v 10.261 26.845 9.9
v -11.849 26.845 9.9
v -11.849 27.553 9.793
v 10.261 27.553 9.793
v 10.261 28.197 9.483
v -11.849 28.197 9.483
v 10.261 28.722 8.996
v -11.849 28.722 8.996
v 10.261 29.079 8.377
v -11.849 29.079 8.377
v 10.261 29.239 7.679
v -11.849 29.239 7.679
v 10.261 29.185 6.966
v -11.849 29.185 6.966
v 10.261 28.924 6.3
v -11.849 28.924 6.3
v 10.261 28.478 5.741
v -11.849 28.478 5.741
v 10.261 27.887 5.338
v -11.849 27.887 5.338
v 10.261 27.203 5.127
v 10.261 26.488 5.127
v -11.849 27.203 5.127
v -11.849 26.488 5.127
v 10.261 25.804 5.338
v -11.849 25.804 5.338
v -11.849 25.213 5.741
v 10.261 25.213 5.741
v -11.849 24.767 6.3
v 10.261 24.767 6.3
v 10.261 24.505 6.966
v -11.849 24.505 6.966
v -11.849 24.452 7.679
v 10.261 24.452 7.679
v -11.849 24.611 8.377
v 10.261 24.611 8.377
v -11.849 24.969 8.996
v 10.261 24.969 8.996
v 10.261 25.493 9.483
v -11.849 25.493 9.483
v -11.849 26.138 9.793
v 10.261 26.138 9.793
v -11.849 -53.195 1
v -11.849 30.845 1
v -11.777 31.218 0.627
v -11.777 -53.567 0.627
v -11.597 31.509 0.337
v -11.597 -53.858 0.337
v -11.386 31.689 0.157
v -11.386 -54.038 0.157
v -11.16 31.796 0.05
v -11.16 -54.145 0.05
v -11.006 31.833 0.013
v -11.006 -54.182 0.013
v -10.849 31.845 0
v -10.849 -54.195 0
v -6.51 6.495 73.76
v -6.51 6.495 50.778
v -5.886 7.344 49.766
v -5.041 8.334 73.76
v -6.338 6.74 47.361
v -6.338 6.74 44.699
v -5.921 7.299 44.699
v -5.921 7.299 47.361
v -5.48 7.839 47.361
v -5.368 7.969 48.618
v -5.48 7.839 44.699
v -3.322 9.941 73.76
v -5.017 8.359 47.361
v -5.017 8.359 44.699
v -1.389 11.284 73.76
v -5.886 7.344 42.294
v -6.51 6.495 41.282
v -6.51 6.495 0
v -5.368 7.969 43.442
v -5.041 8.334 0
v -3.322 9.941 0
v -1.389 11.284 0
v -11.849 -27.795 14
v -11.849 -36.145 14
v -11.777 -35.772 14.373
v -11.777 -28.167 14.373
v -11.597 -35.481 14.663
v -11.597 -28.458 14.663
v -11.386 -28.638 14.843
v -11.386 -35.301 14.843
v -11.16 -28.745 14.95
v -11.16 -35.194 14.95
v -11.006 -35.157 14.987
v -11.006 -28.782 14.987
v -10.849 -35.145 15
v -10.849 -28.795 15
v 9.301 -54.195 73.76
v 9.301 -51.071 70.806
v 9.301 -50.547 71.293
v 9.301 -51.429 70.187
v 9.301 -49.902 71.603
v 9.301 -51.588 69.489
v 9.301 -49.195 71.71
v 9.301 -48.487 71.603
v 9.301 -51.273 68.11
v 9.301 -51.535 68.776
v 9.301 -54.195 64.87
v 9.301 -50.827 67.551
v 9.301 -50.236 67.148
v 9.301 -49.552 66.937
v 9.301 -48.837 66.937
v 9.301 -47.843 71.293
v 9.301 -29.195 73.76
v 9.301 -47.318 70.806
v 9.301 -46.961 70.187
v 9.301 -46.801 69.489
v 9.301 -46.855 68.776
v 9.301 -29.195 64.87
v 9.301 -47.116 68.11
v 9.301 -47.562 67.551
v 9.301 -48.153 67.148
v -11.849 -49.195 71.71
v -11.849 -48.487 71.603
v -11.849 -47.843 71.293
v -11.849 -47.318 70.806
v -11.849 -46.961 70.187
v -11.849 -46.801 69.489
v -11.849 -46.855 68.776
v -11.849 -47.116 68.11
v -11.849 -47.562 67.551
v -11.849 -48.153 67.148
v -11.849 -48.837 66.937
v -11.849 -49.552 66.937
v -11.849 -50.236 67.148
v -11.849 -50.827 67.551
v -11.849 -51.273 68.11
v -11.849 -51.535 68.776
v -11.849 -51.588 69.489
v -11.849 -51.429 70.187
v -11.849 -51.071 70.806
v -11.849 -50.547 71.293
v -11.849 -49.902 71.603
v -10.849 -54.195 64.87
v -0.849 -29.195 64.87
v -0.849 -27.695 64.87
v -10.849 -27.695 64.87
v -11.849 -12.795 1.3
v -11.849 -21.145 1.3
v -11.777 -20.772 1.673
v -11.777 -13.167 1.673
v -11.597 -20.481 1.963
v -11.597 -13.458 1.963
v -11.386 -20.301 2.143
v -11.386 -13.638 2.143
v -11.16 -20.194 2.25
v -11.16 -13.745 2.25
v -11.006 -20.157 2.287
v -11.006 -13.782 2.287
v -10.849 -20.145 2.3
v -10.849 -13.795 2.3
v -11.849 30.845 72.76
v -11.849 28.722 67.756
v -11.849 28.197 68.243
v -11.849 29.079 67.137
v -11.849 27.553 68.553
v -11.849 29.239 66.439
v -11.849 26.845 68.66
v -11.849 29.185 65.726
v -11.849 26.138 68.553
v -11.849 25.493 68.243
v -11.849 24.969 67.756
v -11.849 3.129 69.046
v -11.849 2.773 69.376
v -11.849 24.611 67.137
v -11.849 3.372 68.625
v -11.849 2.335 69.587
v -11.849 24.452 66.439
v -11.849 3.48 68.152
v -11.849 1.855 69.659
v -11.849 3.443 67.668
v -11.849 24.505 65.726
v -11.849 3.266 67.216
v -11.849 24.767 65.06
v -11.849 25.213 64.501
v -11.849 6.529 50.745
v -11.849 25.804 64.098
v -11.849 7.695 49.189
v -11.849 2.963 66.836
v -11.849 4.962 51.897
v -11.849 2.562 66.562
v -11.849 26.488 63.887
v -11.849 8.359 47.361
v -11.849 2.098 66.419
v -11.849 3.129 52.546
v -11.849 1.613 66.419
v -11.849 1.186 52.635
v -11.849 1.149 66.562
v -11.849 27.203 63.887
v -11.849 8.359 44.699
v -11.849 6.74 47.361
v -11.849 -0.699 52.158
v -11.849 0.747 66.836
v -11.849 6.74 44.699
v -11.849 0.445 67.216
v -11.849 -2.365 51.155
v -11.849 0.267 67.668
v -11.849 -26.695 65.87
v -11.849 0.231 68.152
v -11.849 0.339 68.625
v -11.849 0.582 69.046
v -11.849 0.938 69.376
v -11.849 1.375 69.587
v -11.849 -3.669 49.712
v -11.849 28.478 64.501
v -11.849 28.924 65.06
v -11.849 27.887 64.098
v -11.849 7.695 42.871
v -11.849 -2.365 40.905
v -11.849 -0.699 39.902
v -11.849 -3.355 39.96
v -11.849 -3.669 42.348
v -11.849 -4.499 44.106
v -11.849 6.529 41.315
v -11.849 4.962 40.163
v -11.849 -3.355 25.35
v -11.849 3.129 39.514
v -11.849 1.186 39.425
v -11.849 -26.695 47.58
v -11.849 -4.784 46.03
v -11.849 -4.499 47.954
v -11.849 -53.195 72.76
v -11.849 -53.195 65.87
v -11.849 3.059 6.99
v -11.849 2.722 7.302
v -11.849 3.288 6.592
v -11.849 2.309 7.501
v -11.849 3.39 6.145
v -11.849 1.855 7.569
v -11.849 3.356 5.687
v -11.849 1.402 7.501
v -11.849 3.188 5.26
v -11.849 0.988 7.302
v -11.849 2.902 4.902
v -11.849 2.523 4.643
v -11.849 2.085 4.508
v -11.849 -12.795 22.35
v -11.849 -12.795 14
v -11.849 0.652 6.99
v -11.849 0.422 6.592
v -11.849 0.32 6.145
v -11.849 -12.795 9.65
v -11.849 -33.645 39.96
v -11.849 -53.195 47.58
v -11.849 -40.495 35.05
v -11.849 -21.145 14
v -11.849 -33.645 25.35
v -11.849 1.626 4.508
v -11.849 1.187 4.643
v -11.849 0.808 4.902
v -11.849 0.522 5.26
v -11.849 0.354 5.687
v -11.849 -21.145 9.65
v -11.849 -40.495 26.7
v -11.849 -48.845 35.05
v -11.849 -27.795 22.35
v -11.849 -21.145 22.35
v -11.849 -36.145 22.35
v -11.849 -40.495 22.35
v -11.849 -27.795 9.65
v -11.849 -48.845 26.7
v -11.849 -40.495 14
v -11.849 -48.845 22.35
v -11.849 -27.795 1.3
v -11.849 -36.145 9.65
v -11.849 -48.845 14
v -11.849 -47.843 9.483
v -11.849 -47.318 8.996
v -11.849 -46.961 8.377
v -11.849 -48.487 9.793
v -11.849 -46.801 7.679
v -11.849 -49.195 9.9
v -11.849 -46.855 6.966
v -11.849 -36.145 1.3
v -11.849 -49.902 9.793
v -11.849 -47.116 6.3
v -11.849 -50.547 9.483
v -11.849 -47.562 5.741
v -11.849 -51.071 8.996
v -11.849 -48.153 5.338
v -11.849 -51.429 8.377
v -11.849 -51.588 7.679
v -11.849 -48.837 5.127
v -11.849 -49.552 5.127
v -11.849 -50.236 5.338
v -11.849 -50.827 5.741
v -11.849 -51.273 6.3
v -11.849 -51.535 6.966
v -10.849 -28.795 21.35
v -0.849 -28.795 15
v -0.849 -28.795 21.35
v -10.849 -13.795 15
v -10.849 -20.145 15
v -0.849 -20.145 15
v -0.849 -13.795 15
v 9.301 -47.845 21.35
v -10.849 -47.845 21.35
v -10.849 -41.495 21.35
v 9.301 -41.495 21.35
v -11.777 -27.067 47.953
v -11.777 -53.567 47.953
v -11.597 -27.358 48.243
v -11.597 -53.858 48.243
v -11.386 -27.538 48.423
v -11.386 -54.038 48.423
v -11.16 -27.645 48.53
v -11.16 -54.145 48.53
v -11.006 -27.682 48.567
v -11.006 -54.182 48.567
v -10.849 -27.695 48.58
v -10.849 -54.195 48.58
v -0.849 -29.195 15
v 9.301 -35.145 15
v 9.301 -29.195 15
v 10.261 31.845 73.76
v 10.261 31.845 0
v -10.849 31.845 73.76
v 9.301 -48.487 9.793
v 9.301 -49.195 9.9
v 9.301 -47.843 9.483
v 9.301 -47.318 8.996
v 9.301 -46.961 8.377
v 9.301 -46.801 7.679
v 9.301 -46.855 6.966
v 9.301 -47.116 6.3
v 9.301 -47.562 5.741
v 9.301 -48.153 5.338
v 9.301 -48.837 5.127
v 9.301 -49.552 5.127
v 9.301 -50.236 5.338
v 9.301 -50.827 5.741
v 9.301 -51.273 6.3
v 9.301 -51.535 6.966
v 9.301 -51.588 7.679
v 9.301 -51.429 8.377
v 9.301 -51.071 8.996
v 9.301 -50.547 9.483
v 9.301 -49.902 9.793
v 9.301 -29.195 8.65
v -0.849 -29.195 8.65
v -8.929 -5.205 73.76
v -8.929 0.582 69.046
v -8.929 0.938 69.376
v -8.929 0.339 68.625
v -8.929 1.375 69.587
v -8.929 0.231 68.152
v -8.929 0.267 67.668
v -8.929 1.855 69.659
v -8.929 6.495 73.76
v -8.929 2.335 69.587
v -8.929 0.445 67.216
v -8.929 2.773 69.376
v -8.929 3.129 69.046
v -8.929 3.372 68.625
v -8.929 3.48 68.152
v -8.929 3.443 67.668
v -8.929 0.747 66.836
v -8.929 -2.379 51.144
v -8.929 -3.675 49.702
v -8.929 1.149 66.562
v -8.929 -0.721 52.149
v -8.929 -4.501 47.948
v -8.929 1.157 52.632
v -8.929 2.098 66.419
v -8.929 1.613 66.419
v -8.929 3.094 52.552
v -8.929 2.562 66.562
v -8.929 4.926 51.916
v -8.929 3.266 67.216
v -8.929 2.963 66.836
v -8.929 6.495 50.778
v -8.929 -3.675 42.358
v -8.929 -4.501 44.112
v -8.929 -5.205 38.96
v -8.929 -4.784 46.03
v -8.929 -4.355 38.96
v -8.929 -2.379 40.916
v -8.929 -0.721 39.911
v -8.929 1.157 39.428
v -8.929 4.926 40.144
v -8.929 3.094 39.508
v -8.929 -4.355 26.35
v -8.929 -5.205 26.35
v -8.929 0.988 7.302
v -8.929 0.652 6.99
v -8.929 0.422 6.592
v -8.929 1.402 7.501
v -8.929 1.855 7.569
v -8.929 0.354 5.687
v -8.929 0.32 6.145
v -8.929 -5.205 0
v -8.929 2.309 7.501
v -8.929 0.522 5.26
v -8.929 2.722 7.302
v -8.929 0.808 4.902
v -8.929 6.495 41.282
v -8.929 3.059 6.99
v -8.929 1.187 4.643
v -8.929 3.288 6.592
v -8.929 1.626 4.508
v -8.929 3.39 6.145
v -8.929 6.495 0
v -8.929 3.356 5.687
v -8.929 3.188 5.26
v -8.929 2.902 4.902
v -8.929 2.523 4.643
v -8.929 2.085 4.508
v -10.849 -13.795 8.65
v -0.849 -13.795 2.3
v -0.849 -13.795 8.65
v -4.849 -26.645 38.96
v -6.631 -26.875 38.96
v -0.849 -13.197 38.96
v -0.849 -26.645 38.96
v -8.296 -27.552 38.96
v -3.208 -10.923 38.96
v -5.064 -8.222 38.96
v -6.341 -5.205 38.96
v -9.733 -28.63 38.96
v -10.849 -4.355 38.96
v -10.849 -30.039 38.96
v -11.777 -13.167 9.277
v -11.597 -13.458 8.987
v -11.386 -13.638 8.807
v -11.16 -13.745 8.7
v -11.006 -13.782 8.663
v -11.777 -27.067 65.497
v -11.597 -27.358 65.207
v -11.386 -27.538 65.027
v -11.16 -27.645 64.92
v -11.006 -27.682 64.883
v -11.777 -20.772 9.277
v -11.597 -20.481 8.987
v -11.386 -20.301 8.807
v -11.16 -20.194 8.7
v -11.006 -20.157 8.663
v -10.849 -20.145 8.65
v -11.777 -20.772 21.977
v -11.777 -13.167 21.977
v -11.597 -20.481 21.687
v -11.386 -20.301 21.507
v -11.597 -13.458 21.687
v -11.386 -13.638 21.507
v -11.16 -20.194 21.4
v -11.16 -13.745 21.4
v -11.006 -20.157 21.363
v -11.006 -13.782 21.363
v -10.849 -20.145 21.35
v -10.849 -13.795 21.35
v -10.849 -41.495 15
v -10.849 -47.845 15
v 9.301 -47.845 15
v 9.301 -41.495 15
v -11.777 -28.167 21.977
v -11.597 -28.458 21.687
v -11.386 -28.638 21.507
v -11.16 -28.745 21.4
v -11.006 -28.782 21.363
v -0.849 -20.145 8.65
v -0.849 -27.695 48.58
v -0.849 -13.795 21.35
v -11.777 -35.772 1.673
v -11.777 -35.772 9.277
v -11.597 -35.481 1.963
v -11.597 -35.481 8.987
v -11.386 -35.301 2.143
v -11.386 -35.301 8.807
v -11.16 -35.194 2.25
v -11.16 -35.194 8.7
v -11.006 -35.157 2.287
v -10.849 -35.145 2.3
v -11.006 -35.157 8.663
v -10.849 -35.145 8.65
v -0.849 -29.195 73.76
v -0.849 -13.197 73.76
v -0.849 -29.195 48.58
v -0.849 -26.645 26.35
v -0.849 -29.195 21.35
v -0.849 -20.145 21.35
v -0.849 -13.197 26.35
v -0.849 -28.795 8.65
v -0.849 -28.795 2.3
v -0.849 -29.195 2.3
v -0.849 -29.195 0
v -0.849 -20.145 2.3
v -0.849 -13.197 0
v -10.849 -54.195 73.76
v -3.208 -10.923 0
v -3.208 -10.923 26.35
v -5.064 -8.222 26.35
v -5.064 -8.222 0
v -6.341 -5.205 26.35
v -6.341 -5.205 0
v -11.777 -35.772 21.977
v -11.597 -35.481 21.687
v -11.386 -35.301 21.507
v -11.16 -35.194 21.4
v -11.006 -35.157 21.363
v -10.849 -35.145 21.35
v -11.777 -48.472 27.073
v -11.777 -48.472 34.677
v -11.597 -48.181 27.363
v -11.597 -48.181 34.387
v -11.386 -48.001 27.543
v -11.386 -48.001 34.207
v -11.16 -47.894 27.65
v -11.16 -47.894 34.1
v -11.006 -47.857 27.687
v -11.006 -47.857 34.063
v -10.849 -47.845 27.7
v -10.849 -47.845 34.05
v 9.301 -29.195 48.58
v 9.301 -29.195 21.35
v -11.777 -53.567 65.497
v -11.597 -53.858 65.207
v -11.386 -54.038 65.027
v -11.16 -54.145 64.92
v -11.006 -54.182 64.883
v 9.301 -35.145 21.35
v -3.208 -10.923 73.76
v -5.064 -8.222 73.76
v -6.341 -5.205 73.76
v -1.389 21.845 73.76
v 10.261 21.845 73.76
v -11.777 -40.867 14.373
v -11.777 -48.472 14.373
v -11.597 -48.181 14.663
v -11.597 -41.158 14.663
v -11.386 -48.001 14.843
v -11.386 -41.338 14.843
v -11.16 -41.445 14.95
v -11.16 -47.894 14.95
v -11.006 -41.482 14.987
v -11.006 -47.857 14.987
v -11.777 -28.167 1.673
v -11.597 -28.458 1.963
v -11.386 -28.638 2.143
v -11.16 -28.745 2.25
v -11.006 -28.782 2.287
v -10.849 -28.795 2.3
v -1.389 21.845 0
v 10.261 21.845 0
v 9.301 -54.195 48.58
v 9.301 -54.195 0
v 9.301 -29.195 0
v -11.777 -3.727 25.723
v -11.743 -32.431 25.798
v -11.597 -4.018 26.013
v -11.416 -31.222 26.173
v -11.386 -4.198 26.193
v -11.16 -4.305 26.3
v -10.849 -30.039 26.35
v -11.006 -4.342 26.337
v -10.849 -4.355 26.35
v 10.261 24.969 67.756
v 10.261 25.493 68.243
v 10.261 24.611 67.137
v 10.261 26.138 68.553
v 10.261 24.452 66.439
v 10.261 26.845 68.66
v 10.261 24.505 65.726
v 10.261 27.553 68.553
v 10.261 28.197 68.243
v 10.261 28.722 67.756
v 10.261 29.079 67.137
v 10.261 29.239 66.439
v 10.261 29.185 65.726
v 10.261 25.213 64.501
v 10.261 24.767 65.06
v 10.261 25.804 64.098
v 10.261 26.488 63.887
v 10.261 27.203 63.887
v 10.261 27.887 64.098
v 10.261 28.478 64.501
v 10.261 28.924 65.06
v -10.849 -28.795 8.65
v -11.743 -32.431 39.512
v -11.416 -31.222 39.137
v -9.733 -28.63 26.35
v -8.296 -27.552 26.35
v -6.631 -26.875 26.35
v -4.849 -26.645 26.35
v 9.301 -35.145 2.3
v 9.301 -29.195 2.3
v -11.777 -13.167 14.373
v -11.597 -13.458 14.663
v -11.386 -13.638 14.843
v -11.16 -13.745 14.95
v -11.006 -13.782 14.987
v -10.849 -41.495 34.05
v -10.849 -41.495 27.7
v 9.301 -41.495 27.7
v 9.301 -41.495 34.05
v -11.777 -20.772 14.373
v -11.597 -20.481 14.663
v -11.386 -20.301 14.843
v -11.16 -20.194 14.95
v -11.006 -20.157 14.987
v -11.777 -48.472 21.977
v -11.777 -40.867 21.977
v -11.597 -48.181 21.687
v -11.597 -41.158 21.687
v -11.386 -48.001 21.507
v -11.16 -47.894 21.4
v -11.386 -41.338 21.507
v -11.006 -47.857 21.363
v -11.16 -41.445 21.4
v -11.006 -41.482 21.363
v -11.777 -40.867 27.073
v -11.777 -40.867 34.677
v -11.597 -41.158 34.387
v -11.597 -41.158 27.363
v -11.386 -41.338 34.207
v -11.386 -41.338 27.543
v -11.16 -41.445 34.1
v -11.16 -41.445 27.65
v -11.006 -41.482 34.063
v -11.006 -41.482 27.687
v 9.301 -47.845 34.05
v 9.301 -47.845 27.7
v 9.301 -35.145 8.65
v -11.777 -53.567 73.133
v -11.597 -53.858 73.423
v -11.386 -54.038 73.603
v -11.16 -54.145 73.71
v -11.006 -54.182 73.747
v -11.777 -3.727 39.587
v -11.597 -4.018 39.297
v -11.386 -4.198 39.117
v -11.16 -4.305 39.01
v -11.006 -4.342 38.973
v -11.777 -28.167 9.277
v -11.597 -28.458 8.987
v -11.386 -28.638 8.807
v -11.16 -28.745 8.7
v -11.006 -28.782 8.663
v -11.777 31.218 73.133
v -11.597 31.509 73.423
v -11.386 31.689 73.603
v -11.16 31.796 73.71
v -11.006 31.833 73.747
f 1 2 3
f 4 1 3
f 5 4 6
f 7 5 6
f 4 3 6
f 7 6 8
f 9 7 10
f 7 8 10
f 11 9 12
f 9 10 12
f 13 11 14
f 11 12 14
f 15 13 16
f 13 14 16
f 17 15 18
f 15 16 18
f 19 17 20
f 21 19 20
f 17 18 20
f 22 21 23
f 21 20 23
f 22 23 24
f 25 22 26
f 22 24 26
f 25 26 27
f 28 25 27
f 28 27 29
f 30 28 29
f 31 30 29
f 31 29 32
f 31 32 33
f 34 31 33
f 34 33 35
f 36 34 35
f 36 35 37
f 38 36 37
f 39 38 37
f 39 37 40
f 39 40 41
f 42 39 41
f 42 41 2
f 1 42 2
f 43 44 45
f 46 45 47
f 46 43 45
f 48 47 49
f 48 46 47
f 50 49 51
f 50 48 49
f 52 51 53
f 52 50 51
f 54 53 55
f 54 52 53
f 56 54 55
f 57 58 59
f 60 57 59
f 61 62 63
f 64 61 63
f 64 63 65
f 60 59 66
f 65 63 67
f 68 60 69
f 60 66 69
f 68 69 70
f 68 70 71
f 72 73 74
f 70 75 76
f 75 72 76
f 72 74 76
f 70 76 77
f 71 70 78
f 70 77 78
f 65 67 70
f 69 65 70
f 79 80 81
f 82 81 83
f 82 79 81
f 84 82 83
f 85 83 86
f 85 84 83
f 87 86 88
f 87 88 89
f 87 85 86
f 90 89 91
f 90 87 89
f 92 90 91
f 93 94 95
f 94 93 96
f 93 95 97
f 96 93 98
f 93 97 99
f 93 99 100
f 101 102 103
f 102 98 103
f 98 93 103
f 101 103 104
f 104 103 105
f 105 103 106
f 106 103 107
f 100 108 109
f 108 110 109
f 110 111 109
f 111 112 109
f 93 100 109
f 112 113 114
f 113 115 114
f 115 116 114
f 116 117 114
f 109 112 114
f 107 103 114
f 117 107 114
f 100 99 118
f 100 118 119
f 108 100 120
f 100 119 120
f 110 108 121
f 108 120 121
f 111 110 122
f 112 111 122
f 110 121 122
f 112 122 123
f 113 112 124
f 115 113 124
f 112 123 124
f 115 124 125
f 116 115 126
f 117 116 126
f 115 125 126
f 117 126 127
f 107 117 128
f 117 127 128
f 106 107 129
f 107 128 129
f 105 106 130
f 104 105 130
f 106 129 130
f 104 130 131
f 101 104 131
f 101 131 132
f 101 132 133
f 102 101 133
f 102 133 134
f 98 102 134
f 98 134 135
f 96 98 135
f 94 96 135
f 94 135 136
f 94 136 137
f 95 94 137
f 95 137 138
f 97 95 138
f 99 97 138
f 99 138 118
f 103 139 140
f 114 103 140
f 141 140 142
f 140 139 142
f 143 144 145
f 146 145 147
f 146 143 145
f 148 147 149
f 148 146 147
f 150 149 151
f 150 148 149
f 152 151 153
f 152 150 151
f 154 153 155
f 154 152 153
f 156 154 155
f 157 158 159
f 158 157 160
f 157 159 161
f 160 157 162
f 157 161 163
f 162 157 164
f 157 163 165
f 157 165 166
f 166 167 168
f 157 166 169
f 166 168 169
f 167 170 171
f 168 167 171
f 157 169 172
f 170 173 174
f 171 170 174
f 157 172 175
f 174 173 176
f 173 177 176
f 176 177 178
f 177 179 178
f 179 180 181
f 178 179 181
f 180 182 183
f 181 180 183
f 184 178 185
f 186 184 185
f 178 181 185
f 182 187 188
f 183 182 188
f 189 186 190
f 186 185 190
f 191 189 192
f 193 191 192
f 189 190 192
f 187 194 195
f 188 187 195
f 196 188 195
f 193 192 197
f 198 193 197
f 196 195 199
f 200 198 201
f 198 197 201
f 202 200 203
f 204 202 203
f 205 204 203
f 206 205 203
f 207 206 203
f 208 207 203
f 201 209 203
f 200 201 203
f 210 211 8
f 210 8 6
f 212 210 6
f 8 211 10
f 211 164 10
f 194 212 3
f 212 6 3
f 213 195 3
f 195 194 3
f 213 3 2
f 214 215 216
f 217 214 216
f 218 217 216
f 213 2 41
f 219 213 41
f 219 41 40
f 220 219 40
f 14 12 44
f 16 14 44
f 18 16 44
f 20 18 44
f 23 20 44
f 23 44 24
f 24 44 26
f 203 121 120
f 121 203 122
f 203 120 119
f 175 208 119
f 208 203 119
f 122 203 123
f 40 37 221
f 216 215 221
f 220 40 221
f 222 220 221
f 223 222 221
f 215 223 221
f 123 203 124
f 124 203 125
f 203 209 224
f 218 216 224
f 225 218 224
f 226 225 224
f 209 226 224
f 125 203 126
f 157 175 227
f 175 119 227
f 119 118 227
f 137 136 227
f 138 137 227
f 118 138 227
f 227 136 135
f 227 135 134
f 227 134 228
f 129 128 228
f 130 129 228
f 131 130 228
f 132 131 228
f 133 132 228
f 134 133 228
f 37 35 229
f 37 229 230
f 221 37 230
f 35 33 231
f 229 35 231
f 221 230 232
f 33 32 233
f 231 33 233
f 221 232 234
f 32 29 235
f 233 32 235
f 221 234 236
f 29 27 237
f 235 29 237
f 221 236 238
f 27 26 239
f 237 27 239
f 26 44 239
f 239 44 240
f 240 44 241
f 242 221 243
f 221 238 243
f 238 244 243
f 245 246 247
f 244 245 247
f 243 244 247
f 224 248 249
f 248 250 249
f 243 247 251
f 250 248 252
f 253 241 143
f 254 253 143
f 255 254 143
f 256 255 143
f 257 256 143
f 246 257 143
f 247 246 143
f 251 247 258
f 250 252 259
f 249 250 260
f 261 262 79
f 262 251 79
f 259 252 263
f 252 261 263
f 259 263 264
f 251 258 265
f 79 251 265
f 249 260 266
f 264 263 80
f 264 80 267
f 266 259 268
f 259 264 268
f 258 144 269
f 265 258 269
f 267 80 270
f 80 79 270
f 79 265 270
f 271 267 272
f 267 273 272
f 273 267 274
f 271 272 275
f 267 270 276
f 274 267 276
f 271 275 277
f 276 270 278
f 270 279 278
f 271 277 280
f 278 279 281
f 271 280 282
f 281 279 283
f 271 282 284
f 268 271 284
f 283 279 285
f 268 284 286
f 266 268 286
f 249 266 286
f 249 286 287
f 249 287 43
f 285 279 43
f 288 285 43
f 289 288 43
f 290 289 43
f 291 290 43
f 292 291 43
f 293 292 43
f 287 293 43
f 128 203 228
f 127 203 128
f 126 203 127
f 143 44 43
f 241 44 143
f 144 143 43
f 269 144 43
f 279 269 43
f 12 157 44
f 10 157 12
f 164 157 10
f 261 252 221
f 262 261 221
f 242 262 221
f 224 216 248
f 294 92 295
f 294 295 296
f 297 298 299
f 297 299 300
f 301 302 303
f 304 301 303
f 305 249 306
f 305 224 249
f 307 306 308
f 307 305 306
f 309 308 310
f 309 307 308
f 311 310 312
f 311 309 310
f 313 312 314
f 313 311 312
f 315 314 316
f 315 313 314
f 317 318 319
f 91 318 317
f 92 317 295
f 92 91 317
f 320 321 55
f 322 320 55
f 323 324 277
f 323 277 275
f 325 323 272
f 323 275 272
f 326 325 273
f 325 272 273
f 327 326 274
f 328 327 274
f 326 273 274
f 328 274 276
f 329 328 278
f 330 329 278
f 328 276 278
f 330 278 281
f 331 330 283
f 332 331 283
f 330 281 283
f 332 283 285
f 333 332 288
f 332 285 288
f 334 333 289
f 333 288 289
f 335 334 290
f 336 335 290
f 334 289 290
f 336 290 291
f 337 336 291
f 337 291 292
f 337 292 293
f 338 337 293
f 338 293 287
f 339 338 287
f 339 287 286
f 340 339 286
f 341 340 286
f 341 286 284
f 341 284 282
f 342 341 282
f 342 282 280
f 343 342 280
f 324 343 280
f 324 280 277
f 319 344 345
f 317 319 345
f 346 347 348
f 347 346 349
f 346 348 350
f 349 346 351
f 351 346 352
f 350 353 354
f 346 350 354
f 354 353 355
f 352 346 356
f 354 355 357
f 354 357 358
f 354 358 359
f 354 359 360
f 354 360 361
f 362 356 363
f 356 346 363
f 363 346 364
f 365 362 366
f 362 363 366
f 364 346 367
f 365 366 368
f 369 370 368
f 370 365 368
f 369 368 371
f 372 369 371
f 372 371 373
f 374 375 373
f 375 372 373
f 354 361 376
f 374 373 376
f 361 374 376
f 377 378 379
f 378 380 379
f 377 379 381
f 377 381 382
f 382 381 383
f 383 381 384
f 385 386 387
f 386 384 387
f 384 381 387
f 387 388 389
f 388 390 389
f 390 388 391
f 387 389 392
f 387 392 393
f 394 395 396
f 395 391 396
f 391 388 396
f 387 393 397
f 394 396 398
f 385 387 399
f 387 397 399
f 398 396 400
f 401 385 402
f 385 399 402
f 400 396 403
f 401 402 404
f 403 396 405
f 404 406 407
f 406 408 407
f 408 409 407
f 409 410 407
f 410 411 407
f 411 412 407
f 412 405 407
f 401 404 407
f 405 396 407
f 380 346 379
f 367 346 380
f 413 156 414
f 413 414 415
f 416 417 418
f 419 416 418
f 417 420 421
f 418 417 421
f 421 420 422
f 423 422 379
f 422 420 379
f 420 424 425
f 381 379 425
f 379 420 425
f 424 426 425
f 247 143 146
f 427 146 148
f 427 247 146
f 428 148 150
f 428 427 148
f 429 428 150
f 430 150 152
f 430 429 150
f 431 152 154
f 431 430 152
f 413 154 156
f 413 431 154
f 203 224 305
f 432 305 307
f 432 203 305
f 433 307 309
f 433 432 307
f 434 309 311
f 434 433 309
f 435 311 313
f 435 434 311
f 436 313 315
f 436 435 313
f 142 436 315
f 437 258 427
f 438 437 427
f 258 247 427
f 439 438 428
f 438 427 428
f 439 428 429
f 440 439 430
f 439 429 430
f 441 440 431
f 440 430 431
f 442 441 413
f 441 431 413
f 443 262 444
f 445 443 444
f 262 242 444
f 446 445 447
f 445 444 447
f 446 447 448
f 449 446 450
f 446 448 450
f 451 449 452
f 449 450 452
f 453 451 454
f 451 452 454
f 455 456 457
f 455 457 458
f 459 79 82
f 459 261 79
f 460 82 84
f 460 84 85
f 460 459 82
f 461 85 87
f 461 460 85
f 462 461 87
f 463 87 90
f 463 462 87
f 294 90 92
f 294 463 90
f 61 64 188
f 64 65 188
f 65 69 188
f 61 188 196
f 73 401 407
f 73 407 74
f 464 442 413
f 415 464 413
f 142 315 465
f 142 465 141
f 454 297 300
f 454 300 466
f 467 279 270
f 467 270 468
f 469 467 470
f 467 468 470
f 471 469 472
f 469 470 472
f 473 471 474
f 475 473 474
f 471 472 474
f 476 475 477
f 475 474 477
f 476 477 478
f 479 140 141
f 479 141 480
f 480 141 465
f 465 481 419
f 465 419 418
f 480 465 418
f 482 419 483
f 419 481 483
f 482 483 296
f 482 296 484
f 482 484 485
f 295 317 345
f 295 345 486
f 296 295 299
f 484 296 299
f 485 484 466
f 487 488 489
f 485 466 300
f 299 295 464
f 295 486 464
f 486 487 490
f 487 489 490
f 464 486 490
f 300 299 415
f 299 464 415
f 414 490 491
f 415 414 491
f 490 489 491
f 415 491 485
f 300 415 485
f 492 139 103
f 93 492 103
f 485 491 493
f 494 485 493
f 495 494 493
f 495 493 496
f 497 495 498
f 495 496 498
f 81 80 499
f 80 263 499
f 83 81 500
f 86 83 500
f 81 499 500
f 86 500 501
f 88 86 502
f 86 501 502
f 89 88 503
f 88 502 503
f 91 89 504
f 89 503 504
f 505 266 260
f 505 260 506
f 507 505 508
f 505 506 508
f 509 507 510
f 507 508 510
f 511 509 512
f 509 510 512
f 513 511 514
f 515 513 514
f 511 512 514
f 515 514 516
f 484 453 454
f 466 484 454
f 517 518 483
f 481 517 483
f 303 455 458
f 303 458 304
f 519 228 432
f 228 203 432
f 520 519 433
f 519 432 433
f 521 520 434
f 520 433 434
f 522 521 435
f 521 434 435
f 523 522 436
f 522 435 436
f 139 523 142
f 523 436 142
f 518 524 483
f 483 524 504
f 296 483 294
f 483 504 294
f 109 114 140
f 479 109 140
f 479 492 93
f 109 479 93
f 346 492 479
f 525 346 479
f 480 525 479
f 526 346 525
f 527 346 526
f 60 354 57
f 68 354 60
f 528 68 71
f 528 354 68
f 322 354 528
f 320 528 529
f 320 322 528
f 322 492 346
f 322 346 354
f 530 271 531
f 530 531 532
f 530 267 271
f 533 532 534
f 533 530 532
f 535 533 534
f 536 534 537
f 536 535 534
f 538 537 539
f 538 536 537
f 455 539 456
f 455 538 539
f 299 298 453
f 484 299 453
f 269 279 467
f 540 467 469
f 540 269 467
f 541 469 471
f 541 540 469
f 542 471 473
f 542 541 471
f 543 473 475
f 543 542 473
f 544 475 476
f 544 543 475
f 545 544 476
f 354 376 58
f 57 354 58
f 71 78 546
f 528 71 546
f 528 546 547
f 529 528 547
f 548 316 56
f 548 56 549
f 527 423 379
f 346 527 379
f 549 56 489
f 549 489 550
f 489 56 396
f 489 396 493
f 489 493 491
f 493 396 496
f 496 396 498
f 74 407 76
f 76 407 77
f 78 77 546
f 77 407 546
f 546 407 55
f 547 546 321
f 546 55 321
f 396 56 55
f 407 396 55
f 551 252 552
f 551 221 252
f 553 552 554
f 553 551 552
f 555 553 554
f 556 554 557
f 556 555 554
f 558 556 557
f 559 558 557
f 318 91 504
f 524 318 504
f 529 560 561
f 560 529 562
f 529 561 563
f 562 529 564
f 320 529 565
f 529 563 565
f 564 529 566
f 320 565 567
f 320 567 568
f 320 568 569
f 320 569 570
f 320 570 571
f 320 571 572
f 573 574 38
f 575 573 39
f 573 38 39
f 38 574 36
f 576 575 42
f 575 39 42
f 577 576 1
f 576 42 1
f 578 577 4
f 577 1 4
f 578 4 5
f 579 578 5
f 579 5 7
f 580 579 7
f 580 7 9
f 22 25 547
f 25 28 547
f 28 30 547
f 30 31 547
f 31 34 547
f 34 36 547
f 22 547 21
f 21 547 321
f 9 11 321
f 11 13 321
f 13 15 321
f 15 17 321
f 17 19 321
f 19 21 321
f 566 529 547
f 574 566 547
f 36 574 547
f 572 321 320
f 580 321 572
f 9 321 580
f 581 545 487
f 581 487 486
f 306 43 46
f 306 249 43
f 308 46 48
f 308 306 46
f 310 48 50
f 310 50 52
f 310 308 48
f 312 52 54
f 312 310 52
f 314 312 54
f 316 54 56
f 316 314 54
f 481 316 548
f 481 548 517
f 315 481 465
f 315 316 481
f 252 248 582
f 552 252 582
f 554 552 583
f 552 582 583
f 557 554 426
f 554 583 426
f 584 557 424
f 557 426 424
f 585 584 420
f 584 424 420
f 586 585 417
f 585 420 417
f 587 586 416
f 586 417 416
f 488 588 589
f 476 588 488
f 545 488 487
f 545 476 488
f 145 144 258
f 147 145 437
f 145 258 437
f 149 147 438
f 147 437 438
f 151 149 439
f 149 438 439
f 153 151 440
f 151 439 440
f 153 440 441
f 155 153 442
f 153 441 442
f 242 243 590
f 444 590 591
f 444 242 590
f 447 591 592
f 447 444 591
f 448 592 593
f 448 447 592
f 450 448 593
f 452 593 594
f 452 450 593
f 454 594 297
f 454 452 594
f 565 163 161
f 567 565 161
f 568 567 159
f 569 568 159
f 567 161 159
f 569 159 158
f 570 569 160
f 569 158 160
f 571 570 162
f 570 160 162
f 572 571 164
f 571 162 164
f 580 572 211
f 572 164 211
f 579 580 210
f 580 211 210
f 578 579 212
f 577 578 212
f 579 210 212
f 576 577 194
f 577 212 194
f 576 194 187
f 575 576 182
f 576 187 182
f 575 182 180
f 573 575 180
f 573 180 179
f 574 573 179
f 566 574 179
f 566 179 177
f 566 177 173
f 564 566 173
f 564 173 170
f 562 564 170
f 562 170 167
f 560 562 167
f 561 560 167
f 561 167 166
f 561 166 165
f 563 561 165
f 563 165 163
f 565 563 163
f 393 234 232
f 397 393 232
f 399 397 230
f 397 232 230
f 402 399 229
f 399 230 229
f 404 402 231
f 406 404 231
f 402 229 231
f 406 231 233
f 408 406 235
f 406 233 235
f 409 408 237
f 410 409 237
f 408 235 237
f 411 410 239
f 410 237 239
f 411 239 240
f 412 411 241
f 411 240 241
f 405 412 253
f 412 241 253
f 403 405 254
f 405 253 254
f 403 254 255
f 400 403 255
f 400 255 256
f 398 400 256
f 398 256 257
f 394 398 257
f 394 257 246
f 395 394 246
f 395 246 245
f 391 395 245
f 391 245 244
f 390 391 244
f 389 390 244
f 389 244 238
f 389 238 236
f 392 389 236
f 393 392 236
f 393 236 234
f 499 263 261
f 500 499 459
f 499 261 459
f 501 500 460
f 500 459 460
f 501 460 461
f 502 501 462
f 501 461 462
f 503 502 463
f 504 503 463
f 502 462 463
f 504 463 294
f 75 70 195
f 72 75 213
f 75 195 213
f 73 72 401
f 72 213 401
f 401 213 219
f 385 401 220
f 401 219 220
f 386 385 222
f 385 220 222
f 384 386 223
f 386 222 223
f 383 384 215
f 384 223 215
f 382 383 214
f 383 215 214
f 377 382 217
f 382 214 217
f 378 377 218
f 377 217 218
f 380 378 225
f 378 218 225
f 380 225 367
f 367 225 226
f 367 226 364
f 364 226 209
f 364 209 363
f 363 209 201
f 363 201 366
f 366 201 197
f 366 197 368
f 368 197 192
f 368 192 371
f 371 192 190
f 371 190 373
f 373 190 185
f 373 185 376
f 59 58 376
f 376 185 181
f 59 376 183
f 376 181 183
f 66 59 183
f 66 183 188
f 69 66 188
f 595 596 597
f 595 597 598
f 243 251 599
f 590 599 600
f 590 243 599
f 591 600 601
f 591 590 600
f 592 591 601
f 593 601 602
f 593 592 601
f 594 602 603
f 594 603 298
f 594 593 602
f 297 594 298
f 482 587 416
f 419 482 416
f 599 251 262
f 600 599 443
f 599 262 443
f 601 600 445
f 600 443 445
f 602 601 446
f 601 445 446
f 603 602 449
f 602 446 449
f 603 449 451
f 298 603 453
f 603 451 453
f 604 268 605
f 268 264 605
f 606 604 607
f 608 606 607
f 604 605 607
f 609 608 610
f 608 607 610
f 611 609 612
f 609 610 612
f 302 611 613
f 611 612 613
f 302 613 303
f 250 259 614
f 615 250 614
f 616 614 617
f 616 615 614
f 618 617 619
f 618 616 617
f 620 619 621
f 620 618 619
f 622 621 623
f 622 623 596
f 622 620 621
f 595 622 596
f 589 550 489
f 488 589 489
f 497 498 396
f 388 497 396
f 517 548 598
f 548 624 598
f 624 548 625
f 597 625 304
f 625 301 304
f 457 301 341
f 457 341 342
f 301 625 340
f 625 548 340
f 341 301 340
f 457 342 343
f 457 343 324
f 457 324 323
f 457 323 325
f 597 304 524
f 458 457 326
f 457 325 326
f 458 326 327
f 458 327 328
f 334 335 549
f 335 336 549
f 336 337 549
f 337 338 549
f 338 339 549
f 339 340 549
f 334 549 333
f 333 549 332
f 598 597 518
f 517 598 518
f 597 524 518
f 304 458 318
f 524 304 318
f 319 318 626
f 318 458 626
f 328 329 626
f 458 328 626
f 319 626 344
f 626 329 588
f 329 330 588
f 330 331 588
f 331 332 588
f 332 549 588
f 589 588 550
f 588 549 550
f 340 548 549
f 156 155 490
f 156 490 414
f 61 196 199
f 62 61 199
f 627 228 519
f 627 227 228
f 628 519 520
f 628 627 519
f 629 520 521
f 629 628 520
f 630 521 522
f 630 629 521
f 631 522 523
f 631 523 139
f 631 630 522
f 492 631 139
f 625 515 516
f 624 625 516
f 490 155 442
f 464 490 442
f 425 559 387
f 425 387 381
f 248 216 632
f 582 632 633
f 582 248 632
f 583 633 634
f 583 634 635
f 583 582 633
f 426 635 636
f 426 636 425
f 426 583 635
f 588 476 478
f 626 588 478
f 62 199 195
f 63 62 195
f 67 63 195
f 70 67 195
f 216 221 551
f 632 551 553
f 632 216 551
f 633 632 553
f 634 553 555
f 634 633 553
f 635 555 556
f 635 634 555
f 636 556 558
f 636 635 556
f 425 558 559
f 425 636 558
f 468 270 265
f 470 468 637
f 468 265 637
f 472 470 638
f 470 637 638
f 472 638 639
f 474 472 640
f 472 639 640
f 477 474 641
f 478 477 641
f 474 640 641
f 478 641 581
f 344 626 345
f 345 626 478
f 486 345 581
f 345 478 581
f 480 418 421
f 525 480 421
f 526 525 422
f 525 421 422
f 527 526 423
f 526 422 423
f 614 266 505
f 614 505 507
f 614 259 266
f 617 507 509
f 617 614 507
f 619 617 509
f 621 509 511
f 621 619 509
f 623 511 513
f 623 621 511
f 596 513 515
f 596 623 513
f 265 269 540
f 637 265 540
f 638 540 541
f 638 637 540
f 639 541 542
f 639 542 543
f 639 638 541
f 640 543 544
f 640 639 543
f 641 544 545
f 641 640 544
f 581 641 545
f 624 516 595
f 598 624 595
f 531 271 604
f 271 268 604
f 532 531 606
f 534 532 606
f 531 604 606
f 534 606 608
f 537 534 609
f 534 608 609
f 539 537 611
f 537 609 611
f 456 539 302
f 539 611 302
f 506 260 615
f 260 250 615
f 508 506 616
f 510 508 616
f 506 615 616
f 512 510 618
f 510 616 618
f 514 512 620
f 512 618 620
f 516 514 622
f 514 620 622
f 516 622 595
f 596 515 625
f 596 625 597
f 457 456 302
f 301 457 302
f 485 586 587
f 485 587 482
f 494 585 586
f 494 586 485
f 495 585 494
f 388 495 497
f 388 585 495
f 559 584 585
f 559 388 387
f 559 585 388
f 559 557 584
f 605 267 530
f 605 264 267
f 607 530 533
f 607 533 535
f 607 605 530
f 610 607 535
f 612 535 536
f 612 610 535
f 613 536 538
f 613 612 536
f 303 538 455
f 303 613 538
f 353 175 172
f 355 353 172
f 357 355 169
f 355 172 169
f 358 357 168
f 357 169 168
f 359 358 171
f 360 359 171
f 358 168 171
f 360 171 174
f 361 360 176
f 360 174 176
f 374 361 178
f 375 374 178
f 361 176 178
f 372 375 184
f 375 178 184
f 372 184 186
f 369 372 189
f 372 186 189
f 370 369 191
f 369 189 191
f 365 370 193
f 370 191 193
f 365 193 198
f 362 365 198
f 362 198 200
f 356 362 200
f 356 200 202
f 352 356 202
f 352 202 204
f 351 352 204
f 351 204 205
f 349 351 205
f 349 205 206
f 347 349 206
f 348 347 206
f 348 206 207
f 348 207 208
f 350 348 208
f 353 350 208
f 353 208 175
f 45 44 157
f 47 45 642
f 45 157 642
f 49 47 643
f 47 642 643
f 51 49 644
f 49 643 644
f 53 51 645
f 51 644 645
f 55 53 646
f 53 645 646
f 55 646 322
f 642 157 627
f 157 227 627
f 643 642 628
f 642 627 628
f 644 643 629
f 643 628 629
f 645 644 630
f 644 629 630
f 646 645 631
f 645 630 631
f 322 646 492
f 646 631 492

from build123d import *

# Parameters (mm, degrees)
PROFILEEXTRUDE_DEPTH    = 73.76
HOSEWINDOW_W            = 16.29
HOSEWINDOW_H            = 26.5
HOSEWINDOWCUT_DEPTH     = 23.11
CAGESCREWS_R            = 2.4
CAGESCREWSCUT_DEPTH     = 23.11
AXLEHOLECUT_DEPTH       = 23.11
SETSCREWHOLES_R         = 1.539432213
SETSCREWHOLES_R_2       = 1.628953018
SETSCREWHOLESCUT_DEPTH  = 23.11
VELOCITYWINDOW_W        = 12.61
VELOCITYWINDOW_H        = 22.29
VELOCITYWINDOWCUT_DEPTH = 23.11
FILLET3_R               = 7
TRIGGERRACKSLOTCUT_W    = 6.35
TRIGGERRACKSLOTCUT_H    = 6.35
RACKSLOTCUT_DEPTH       = 23.11
FILLET4_R               = 1


with BuildPart() as part:
    # Profile → ProfileExtrude (new body)
    with BuildSketch(Plane.XY):
        with BuildLine():
            Line((9.301269376, -54.194713793), (9.301269376, -29.194713793))
            Line((9.301269376, -29.194713793), (-0.848730624, -29.194713793))
            Line((-0.848730624, -29.194713793), (-0.848730624, -13.196583793))
            ThreePointArc((-0.848730624, -13.196583793), (-4.204324299, -9.619560571), (-6.340730624, -5.204713793))
            Line((-6.340730624, -5.204713793), (-8.928730624, -5.204713793))
            Line((-8.928730624, -5.204713793), (-8.928730624, 6.495286207))
            Line((-8.928730624, 6.495286207), (-6.509650624, 6.495286207))
            ThreePointArc((-6.509650624, 6.495286207), (-4.210311879, 9.168674207), (-1.388730624, 11.283536207))
            Line((-1.388730624, 11.283536207), (-1.388730624, 21.845286207))
            Line((-1.388730624, 21.845286207), (10.261269376, 21.845286207))
            Line((10.261269376, 21.845286207), (10.261269376, 31.845286207))
            Line((10.261269376, 31.845286207), (-11.848730624, 31.845286207))
            Line((-11.848730624, 31.845286207), (-11.848730624, -54.194713793))
            Line((-11.848730624, -54.194713793), (9.301269376, -54.194713793))
        make_face()
    extrude(amount=PROFILEEXTRUDE_DEPTH)

    # HoseWindow → HoseWindowCut (cut, through all)
    with BuildSketch(Plane.ZY.offset(11.848730624)):
        with Locations((56.725, -40.944713793)):
            Rectangle(HOSEWINDOW_W, HOSEWINDOW_H)
    extrude(amount=-HOSEWINDOWCUT_DEPTH, mode=Mode.SUBTRACT)

    # CageScrews → CageScrewsCut (cut, through all)
    with BuildSketch(Plane.ZY.offset(11.848730624)):
        with Locations((7.5, 26.845286207)):
            Circle(CAGESCREWS_R)
        with Locations((66.26, 26.845286207)):
            Circle(CAGESCREWS_R)
        with Locations((7.5, -49.194713793)):
            Circle(CAGESCREWS_R)
        with Locations((69.31, -49.194713793)):
            Circle(CAGESCREWS_R)
    extrude(amount=-CAGESCREWSCUT_DEPTH, mode=Mode.SUBTRACT)

    # AxleHole → AxleHoleCut (cut, through all)
    with BuildSketch(Plane.ZY.offset(11.848730624)):
        with BuildLine():
            Line((47.361, 8.359497151), (47.361, 6.740497151))
            Line((47.361, 6.740497151), (44.699, 6.740497151))
            Line((44.699, 6.740497151), (44.699, 8.359497151))
            ThreePointArc((44.699, 8.359497151), (46.03, -4.783713793), (47.361, 8.359497151))
        make_face()
    extrude(amount=-AXLEHOLECUT_DEPTH, mode=Mode.SUBTRACT)

    # SetScrewHoles → SetScrewHolesCut (cut, through all)
    with BuildSketch(Plane.ZY.offset(11.848730624)):
        with Locations((6.03, 1.855286207)):
            Circle(SETSCREWHOLES_R)
        with Locations((68.03, 1.855286207)):
            Circle(SETSCREWHOLES_R_2)
    extrude(amount=-SETSCREWHOLESCUT_DEPTH, mode=Mode.SUBTRACT)

    # VelocityWindow → VelocityWindowCut (cut, through all)
    with BuildSketch(Plane.ZY.offset(11.848730624)):
        with Locations((32.655, -15.499713793)):
            Rectangle(VELOCITYWINDOW_W, VELOCITYWINDOW_H)
    extrude(amount=-VELOCITYWINDOWCUT_DEPTH, mode=Mode.SUBTRACT)

    # Fillet3
    fillet3_edges = [part.edges().sort_by_distance(p)[0] for p in [
        (-11.848730624, -26.644713793, 32.655),
    ]]
    fillet(fillet3_edges, radius=FILLET3_R)

    # TriggerRackSlotCut → RackSlotCut (cut, through all)
    with BuildSketch(Plane.ZY.offset(11.848730624)):
        with Locations((18.175, -44.669713793)):
            Rectangle(TRIGGERRACKSLOTCUT_W, TRIGGERRACKSLOTCUT_H)
        with Locations((30.875, -44.669713793)):
            Rectangle(TRIGGERRACKSLOTCUT_W, TRIGGERRACKSLOTCUT_H)
        with Locations((5.475, -31.969713793)):
            Rectangle(TRIGGERRACKSLOTCUT_W, TRIGGERRACKSLOTCUT_H)
        with Locations((18.175, -31.969713793)):
            Rectangle(TRIGGERRACKSLOTCUT_W, TRIGGERRACKSLOTCUT_H)
        with Locations((5.475, -16.969713793)):
            Rectangle(TRIGGERRACKSLOTCUT_W, TRIGGERRACKSLOTCUT_H)
        with Locations((18.175, -16.969713793)):
            Rectangle(TRIGGERRACKSLOTCUT_W, TRIGGERRACKSLOTCUT_H)
    extrude(amount=-RACKSLOTCUT_DEPTH, mode=Mode.SUBTRACT)

    # Fillet4
    fillet4_edges = [part.edges().sort_by_distance(p)[0] for p in [
        (-11.848730624, -11.174713793, 73.76),
        (-11.848730624, -18.999713793, 26.35),
        (-11.848730624, -18.999713793, 38.96),
        (-11.848730624, -4.354713793, 32.655),
        (-11.848730624, -44.669713793, 15),
        (-11.848730624, -47.844713793, 18.175),
        (-11.848730624, -44.669713793, 21.35),
        (-11.848730624, -41.494713793, 18.175),
        (-11.848730624, -11.174713793, 0),
        (-11.848730624, -31.969713793, 2.3),
        (-11.848730624, -35.144713793, 5.475),
        (-11.848730624, -31.969713793, 8.65),
        (-11.848730624, -28.794713793, 5.475),
        (-11.848730624, -44.669713793, 27.7),
        (-11.848730624, -47.844713793, 30.875),
        (-11.848730624, -44.669713793, 34.05),
        (-11.848730624, -41.494713793, 30.875),
        (-11.848730624, -31.969713793, 15),
        (-11.848730624, -35.144713793, 18.175),
        (-11.848730624, -31.969713793, 21.35),
        (-11.848730624, -28.794713793, 18.175),
        (-11.848730624, -54.194713793, 69.315),
        (-11.848730624, 31.845286207, 36.88),
        (-11.848730624, -16.969713793, 2.3),
        (-11.848730624, -20.144713793, 5.475),
        (-11.848730624, -16.969713793, 8.65),
        (-11.848730624, -13.794713793, 5.475),
        (-11.848730624, -16.969713793, 15),
        (-11.848730624, -20.144713793, 18.175),
        (-11.848730624, -16.969713793, 21.35),
        (-11.848730624, -13.794713793, 18.175),
        (-11.848730624, -54.194713793, 24.29),
        (-11.848730624, -40.944713793, 64.87),
        (-11.848730624, -27.694713793, 56.725),
        (-11.848730624, -40.944713793, 48.58),
    ]]
    fillet(fillet4_edges, radius=FILLET4_R)


solid = part.part
